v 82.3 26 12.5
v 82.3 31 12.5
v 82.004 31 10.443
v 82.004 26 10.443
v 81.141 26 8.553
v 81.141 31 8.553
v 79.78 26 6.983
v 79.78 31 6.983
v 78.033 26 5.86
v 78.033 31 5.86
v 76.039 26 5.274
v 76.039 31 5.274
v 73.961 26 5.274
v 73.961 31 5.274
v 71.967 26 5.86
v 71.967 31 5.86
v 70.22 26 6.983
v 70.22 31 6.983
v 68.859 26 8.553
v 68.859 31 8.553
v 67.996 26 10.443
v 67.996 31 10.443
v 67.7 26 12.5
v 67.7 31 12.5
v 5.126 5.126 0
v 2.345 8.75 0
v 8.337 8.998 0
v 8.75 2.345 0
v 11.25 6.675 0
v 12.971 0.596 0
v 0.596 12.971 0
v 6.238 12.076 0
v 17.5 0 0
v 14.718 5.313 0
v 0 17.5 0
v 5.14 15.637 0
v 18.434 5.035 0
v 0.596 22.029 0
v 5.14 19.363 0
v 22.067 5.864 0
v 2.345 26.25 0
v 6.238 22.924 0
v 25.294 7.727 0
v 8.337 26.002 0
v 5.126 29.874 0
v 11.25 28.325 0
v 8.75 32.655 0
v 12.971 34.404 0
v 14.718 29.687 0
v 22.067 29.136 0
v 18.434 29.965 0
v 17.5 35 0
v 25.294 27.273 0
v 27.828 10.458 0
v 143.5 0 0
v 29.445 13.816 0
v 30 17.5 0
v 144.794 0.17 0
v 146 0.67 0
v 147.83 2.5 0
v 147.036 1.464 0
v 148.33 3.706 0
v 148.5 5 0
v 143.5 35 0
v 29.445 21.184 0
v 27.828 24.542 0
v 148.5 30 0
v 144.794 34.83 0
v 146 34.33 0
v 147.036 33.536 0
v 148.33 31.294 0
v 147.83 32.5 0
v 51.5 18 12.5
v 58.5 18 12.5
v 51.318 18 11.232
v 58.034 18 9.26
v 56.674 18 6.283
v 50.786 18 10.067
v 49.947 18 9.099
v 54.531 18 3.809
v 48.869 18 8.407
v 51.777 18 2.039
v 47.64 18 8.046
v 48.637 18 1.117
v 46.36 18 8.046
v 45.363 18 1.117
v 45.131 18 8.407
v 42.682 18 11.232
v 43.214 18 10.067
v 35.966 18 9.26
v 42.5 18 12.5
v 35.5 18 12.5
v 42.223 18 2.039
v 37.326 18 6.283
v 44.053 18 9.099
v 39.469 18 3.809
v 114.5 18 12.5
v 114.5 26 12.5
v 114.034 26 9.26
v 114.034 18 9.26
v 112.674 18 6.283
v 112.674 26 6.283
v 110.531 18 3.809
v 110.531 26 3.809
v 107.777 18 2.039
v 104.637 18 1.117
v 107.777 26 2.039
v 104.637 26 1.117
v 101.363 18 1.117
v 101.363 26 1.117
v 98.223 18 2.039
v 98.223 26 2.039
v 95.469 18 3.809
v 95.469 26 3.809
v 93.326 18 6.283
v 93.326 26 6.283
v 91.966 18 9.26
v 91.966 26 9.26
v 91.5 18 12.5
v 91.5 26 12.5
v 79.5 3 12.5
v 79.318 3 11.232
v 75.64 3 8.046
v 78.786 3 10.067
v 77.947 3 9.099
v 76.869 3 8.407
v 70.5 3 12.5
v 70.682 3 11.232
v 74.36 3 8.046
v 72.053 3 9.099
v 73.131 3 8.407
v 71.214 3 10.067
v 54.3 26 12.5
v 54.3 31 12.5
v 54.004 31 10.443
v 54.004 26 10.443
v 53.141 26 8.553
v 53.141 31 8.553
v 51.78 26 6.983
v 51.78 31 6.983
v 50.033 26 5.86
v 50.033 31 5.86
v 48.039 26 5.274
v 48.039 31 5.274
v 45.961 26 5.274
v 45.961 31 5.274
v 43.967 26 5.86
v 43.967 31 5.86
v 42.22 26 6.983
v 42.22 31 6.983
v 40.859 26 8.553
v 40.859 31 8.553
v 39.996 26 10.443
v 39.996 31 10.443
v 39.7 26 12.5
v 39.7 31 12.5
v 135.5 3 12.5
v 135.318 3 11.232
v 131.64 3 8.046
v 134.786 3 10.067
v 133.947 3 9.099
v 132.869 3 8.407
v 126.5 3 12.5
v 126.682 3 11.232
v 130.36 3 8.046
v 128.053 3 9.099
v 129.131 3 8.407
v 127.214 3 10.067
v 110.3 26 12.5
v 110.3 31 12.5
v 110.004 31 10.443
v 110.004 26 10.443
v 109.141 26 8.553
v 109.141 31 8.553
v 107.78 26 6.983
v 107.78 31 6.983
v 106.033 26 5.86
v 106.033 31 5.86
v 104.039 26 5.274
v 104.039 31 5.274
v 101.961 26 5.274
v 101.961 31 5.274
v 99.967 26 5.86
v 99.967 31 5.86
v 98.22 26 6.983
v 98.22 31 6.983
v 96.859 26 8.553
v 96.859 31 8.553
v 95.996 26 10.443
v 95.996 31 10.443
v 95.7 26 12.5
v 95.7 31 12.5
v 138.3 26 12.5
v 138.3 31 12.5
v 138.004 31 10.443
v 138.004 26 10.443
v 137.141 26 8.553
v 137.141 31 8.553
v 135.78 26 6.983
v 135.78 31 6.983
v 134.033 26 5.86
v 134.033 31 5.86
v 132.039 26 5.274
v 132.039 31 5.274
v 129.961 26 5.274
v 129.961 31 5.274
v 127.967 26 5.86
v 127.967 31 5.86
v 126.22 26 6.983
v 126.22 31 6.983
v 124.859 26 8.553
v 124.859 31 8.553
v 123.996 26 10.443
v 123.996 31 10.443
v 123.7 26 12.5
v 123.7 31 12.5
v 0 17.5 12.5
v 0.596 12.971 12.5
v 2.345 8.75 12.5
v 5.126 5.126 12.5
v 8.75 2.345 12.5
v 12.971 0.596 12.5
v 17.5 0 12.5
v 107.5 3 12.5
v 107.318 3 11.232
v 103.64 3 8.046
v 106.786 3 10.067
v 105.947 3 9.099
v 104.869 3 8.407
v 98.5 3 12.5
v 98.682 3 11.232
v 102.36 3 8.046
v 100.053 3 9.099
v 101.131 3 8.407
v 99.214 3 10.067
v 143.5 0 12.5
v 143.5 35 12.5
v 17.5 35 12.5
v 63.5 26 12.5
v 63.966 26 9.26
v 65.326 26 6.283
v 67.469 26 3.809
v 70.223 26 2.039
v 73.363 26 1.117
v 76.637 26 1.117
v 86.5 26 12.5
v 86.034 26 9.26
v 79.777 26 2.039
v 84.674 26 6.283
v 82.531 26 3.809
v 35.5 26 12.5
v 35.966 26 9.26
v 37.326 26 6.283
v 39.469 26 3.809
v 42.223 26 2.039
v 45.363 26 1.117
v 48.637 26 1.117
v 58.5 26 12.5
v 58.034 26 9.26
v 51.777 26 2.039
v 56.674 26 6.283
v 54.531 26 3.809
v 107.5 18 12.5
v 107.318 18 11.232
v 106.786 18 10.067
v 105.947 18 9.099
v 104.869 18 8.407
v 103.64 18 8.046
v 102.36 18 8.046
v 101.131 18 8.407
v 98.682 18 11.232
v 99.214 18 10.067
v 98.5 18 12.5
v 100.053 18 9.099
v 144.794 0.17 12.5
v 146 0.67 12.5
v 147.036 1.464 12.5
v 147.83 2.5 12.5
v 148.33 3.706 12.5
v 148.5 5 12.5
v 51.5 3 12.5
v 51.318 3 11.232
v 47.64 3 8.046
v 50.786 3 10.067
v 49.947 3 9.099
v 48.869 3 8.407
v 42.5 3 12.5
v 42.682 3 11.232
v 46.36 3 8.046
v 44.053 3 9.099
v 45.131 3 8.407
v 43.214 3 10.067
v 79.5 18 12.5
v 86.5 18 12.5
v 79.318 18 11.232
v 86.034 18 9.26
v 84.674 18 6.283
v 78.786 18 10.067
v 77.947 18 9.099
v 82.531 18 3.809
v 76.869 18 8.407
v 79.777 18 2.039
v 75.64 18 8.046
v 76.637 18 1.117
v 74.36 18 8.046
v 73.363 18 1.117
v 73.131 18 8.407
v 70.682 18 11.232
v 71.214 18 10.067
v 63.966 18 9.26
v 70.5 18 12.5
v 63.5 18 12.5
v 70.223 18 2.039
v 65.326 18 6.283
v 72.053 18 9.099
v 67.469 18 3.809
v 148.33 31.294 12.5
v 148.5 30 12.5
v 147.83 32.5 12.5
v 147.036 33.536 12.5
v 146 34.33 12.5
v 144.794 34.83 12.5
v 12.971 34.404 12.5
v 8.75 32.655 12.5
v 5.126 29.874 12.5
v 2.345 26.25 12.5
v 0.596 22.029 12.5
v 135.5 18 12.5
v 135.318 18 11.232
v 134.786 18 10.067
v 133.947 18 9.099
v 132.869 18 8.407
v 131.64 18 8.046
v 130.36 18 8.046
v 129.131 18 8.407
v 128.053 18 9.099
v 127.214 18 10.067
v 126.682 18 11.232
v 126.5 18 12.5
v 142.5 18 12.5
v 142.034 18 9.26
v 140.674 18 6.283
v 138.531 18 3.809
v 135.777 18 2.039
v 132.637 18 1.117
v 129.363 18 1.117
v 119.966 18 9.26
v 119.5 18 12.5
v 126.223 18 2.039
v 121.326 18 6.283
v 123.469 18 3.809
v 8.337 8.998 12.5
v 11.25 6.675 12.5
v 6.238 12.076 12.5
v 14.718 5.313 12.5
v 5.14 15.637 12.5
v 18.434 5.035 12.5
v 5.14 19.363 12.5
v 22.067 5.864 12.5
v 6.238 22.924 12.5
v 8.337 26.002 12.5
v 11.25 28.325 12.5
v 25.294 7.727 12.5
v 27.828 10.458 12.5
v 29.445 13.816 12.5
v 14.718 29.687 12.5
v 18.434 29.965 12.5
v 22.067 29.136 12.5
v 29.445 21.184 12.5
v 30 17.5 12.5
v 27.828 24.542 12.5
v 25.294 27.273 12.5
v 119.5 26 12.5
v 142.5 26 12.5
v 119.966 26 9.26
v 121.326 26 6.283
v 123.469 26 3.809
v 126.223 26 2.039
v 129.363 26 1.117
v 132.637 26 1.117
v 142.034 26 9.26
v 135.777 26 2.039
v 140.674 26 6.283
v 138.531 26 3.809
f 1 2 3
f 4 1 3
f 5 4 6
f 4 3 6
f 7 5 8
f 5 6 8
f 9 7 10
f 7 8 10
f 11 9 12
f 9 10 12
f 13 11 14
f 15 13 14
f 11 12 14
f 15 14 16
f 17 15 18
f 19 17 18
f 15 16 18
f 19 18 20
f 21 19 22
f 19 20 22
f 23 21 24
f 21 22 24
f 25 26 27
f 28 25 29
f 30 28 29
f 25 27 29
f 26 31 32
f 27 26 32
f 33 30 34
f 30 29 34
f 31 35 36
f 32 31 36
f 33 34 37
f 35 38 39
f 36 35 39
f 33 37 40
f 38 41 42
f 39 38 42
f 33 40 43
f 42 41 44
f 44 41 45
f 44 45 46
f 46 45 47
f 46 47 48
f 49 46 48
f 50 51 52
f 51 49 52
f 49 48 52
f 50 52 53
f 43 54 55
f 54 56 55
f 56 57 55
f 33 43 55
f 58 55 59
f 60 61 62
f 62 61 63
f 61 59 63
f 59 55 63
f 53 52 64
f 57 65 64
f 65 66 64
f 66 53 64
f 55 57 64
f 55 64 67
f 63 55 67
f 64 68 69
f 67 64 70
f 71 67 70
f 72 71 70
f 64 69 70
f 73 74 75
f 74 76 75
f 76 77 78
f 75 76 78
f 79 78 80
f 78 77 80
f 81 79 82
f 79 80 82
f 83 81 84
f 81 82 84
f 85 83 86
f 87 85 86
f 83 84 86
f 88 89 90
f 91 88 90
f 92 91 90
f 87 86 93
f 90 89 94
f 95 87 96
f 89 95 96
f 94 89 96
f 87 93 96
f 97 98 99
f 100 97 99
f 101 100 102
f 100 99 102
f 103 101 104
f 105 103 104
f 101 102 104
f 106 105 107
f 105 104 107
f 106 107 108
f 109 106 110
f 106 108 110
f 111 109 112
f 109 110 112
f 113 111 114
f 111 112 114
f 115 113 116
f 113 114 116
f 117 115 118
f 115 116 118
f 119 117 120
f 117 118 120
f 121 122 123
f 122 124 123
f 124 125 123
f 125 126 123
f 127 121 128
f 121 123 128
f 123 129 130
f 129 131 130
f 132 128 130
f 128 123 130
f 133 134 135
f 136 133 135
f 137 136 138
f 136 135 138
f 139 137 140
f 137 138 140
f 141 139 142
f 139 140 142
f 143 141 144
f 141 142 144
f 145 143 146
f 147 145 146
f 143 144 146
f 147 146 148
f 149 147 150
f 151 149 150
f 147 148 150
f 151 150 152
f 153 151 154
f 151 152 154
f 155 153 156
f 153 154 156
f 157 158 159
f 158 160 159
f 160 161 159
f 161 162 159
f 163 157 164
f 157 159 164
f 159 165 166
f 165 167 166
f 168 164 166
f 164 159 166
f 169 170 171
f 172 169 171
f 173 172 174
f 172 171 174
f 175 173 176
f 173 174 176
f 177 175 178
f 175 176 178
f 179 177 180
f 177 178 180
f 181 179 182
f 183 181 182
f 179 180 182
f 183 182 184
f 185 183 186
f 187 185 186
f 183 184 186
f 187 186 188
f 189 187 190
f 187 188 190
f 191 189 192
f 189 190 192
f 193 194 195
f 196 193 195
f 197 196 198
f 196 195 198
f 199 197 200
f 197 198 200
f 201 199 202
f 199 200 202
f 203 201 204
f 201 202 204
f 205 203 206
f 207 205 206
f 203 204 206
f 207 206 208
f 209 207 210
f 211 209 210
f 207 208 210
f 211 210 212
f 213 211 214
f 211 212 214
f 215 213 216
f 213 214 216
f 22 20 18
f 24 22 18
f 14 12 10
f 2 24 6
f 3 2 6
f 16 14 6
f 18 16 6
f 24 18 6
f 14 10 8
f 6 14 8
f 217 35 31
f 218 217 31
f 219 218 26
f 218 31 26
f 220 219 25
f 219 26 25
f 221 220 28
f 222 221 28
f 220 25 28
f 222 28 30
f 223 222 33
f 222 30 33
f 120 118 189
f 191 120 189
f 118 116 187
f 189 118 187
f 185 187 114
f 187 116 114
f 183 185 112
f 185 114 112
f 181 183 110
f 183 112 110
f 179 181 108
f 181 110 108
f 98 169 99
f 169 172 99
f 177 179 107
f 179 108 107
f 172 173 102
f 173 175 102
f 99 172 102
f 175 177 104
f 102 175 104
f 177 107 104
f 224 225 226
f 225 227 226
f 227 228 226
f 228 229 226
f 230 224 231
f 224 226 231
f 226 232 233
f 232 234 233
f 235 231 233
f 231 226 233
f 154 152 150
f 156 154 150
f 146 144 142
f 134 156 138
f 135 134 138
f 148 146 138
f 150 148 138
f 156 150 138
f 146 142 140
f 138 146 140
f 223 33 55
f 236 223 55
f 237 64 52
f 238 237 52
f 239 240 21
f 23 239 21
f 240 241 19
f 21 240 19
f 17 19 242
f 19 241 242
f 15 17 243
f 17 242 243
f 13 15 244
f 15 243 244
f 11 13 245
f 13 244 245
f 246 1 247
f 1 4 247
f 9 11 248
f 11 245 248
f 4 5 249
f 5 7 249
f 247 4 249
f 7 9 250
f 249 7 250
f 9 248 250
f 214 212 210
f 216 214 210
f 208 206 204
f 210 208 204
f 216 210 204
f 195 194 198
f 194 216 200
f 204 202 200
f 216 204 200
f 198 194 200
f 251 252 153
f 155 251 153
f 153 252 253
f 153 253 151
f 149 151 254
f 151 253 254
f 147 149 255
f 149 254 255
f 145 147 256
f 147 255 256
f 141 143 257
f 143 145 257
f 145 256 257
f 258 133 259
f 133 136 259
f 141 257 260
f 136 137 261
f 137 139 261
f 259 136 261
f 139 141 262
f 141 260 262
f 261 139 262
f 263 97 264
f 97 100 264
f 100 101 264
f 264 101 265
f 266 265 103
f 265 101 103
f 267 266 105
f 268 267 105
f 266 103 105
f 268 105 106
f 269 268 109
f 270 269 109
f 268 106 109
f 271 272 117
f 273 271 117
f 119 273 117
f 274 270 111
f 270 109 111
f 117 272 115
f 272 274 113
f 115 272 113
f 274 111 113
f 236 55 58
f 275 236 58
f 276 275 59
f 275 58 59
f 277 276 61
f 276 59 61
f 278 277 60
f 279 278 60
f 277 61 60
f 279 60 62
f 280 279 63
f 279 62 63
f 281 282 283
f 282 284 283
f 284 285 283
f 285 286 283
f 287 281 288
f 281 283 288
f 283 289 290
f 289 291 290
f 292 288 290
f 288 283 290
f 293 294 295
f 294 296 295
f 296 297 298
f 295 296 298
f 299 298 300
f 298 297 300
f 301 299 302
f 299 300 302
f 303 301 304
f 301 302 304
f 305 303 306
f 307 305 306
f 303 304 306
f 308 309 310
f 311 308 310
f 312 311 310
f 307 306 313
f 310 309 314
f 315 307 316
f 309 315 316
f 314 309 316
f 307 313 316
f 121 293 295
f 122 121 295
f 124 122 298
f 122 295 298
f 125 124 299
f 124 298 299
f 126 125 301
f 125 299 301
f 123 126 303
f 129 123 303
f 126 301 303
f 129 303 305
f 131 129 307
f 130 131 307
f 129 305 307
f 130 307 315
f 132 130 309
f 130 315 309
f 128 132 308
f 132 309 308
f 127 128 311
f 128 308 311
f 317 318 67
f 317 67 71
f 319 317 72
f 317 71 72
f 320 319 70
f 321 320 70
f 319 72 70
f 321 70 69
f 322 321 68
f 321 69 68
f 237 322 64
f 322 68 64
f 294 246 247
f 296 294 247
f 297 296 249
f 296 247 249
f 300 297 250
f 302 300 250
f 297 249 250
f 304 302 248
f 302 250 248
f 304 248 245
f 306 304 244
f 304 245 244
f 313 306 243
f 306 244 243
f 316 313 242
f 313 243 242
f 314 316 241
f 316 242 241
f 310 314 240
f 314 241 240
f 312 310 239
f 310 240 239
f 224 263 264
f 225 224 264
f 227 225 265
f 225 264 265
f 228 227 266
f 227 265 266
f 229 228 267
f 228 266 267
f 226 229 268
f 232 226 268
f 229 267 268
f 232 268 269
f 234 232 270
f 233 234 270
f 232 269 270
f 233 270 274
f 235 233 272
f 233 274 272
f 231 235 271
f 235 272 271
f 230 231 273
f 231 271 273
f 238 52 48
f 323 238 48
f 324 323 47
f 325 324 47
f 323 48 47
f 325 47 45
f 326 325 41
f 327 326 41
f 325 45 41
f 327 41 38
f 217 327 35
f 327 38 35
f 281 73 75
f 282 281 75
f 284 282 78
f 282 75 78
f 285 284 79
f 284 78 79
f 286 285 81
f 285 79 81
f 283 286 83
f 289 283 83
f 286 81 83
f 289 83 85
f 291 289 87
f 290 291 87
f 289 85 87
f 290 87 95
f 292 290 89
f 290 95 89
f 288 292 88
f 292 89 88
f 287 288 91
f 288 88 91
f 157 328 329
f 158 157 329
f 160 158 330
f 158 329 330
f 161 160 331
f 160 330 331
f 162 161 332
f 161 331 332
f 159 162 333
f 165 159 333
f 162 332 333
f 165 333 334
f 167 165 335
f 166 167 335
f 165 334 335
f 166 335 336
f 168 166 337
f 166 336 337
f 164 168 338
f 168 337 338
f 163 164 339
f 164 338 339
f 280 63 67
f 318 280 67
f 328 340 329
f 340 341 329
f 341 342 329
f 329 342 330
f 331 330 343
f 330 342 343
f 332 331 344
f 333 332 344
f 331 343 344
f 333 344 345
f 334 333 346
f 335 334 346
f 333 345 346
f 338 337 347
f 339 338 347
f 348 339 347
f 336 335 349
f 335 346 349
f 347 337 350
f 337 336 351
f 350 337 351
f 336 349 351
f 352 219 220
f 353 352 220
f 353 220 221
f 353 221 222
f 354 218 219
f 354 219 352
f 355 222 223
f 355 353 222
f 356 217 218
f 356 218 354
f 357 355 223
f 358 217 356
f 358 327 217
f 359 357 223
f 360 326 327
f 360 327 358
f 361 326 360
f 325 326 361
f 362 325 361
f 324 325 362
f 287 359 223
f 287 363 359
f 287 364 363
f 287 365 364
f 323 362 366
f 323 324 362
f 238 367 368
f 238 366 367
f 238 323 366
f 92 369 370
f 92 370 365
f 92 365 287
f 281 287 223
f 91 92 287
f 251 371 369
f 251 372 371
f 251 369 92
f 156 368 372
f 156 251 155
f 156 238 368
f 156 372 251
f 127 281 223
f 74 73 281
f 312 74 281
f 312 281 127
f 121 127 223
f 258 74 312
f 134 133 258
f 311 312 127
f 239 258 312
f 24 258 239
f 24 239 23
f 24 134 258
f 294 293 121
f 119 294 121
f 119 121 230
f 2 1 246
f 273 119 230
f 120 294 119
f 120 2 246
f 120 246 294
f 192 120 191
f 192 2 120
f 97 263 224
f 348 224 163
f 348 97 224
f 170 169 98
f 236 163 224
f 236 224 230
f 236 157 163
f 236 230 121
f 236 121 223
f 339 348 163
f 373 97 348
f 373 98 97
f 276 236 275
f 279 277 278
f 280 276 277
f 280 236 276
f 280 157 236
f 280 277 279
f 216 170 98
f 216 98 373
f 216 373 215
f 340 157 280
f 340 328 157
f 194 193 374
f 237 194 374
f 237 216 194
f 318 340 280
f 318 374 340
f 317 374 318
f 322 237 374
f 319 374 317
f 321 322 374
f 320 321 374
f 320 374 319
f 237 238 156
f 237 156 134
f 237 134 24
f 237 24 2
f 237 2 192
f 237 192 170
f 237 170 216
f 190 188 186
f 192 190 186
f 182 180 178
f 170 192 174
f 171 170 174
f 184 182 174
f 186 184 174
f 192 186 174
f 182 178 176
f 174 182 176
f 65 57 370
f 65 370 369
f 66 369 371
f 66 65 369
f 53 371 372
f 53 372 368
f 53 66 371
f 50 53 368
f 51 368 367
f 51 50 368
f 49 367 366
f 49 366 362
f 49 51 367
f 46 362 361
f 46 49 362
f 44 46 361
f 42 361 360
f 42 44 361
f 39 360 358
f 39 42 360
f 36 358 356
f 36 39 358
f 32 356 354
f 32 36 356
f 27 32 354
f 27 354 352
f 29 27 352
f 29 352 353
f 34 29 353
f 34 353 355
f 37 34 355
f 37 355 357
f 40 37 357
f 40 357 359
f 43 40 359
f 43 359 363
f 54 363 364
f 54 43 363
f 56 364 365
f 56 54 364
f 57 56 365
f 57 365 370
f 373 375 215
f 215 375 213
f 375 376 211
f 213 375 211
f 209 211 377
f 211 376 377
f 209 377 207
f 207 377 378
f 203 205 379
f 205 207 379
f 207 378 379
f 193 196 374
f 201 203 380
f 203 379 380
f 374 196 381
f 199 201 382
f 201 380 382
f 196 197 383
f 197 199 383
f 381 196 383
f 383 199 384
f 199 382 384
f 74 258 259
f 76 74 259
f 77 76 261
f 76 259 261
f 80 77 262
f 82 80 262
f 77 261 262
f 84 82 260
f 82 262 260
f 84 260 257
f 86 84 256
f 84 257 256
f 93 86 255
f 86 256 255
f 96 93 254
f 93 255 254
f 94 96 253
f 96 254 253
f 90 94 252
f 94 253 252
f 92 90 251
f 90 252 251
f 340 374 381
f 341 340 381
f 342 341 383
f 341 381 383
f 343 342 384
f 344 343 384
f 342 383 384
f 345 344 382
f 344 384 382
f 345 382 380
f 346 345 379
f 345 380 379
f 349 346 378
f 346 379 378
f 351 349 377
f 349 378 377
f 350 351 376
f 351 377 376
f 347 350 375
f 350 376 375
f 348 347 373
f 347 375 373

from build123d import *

# Parameters (mm, degrees)
F0_R     = 12.5
F1_DEPTH = 12.5


with BuildPart() as f1:
    # F0 (on Top) → F1 (new body)
    with BuildSketch(Plane.XY):
        with BuildLine():
            ThreePointArc((0, 17.5), (5.125631, 5.125631), (17.5, 0))
            Line((17.5, 0), (143.5, 0))
            ThreePointArc((143.5, 0), (147.035534, 1.464466), (148.5, 5))
            Line((148.5, 5), (148.5, 30))
            ThreePointArc((148.5, 30), (147.035534, 33.535534), (143.5, 35))
            Line((143.5, 35), (17.5, 35))
            ThreePointArc((17.5, 35), (5.125631, 29.874369), (0, 17.5))
        make_face()
        with Locations((17.5, 17.5)):
            Circle(F0_R, mode=Mode.SUBTRACT)
    extrude(amount=F1_DEPTH)

    # F2 (on face) → F3 (revolve, cut)
    with BuildSketch(Plane.XY.offset(12.5)):
        Polygon((47, 18), (47, 3), (51.5, 3), (51.5, 18), (58.5, 18), (58.5, 26), (54.3, 26), (54.3, 31), (47, 31), (47, 26), align=None)
    revolve(axis=Axis((47, 10.5, 12.5), (0, 1, 0)), mode=Mode.SUBTRACT)

    # F2 (on face) → F4 (revolve, cut)
    with BuildSketch(Plane.XY.offset(12.5)):
        Polygon((75, 18), (75, 3), (79.5, 3), (79.5, 18), (86.5, 18), (86.5, 26), (82.3, 26), (82.3, 31), (75, 31), (75, 26), align=None)
    revolve(axis=Axis((75, 22, 12.5), (0, 1, 0)), mode=Mode.SUBTRACT)

    # F2 (on face) → F5 (revolve, cut)
    with BuildSketch(Plane.XY.offset(12.5)):
        Polygon((103, 18), (103, 3), (107.5, 3), (107.5, 18), (114.5, 18), (114.5, 26), (110.3, 26), (110.3, 31), (103, 31), (103, 26), align=None)
    revolve(axis=Axis((103, 22, 12.5), (0, 1, 0)), mode=Mode.SUBTRACT)

    # F2 (on face) → F6 (revolve, cut)
    with BuildSketch(Plane.XY.offset(12.5)):
        Polygon((131, 18), (131, 3), (135.5, 3), (135.5, 18), (142.5, 18), (142.5, 26), (138.3, 26), (138.3, 31), (131, 31), (131, 26), align=None)
    revolve(axis=Axis((131, 22, 12.5), (0, 1, 0)), mode=Mode.SUBTRACT)


solid = f1.part
